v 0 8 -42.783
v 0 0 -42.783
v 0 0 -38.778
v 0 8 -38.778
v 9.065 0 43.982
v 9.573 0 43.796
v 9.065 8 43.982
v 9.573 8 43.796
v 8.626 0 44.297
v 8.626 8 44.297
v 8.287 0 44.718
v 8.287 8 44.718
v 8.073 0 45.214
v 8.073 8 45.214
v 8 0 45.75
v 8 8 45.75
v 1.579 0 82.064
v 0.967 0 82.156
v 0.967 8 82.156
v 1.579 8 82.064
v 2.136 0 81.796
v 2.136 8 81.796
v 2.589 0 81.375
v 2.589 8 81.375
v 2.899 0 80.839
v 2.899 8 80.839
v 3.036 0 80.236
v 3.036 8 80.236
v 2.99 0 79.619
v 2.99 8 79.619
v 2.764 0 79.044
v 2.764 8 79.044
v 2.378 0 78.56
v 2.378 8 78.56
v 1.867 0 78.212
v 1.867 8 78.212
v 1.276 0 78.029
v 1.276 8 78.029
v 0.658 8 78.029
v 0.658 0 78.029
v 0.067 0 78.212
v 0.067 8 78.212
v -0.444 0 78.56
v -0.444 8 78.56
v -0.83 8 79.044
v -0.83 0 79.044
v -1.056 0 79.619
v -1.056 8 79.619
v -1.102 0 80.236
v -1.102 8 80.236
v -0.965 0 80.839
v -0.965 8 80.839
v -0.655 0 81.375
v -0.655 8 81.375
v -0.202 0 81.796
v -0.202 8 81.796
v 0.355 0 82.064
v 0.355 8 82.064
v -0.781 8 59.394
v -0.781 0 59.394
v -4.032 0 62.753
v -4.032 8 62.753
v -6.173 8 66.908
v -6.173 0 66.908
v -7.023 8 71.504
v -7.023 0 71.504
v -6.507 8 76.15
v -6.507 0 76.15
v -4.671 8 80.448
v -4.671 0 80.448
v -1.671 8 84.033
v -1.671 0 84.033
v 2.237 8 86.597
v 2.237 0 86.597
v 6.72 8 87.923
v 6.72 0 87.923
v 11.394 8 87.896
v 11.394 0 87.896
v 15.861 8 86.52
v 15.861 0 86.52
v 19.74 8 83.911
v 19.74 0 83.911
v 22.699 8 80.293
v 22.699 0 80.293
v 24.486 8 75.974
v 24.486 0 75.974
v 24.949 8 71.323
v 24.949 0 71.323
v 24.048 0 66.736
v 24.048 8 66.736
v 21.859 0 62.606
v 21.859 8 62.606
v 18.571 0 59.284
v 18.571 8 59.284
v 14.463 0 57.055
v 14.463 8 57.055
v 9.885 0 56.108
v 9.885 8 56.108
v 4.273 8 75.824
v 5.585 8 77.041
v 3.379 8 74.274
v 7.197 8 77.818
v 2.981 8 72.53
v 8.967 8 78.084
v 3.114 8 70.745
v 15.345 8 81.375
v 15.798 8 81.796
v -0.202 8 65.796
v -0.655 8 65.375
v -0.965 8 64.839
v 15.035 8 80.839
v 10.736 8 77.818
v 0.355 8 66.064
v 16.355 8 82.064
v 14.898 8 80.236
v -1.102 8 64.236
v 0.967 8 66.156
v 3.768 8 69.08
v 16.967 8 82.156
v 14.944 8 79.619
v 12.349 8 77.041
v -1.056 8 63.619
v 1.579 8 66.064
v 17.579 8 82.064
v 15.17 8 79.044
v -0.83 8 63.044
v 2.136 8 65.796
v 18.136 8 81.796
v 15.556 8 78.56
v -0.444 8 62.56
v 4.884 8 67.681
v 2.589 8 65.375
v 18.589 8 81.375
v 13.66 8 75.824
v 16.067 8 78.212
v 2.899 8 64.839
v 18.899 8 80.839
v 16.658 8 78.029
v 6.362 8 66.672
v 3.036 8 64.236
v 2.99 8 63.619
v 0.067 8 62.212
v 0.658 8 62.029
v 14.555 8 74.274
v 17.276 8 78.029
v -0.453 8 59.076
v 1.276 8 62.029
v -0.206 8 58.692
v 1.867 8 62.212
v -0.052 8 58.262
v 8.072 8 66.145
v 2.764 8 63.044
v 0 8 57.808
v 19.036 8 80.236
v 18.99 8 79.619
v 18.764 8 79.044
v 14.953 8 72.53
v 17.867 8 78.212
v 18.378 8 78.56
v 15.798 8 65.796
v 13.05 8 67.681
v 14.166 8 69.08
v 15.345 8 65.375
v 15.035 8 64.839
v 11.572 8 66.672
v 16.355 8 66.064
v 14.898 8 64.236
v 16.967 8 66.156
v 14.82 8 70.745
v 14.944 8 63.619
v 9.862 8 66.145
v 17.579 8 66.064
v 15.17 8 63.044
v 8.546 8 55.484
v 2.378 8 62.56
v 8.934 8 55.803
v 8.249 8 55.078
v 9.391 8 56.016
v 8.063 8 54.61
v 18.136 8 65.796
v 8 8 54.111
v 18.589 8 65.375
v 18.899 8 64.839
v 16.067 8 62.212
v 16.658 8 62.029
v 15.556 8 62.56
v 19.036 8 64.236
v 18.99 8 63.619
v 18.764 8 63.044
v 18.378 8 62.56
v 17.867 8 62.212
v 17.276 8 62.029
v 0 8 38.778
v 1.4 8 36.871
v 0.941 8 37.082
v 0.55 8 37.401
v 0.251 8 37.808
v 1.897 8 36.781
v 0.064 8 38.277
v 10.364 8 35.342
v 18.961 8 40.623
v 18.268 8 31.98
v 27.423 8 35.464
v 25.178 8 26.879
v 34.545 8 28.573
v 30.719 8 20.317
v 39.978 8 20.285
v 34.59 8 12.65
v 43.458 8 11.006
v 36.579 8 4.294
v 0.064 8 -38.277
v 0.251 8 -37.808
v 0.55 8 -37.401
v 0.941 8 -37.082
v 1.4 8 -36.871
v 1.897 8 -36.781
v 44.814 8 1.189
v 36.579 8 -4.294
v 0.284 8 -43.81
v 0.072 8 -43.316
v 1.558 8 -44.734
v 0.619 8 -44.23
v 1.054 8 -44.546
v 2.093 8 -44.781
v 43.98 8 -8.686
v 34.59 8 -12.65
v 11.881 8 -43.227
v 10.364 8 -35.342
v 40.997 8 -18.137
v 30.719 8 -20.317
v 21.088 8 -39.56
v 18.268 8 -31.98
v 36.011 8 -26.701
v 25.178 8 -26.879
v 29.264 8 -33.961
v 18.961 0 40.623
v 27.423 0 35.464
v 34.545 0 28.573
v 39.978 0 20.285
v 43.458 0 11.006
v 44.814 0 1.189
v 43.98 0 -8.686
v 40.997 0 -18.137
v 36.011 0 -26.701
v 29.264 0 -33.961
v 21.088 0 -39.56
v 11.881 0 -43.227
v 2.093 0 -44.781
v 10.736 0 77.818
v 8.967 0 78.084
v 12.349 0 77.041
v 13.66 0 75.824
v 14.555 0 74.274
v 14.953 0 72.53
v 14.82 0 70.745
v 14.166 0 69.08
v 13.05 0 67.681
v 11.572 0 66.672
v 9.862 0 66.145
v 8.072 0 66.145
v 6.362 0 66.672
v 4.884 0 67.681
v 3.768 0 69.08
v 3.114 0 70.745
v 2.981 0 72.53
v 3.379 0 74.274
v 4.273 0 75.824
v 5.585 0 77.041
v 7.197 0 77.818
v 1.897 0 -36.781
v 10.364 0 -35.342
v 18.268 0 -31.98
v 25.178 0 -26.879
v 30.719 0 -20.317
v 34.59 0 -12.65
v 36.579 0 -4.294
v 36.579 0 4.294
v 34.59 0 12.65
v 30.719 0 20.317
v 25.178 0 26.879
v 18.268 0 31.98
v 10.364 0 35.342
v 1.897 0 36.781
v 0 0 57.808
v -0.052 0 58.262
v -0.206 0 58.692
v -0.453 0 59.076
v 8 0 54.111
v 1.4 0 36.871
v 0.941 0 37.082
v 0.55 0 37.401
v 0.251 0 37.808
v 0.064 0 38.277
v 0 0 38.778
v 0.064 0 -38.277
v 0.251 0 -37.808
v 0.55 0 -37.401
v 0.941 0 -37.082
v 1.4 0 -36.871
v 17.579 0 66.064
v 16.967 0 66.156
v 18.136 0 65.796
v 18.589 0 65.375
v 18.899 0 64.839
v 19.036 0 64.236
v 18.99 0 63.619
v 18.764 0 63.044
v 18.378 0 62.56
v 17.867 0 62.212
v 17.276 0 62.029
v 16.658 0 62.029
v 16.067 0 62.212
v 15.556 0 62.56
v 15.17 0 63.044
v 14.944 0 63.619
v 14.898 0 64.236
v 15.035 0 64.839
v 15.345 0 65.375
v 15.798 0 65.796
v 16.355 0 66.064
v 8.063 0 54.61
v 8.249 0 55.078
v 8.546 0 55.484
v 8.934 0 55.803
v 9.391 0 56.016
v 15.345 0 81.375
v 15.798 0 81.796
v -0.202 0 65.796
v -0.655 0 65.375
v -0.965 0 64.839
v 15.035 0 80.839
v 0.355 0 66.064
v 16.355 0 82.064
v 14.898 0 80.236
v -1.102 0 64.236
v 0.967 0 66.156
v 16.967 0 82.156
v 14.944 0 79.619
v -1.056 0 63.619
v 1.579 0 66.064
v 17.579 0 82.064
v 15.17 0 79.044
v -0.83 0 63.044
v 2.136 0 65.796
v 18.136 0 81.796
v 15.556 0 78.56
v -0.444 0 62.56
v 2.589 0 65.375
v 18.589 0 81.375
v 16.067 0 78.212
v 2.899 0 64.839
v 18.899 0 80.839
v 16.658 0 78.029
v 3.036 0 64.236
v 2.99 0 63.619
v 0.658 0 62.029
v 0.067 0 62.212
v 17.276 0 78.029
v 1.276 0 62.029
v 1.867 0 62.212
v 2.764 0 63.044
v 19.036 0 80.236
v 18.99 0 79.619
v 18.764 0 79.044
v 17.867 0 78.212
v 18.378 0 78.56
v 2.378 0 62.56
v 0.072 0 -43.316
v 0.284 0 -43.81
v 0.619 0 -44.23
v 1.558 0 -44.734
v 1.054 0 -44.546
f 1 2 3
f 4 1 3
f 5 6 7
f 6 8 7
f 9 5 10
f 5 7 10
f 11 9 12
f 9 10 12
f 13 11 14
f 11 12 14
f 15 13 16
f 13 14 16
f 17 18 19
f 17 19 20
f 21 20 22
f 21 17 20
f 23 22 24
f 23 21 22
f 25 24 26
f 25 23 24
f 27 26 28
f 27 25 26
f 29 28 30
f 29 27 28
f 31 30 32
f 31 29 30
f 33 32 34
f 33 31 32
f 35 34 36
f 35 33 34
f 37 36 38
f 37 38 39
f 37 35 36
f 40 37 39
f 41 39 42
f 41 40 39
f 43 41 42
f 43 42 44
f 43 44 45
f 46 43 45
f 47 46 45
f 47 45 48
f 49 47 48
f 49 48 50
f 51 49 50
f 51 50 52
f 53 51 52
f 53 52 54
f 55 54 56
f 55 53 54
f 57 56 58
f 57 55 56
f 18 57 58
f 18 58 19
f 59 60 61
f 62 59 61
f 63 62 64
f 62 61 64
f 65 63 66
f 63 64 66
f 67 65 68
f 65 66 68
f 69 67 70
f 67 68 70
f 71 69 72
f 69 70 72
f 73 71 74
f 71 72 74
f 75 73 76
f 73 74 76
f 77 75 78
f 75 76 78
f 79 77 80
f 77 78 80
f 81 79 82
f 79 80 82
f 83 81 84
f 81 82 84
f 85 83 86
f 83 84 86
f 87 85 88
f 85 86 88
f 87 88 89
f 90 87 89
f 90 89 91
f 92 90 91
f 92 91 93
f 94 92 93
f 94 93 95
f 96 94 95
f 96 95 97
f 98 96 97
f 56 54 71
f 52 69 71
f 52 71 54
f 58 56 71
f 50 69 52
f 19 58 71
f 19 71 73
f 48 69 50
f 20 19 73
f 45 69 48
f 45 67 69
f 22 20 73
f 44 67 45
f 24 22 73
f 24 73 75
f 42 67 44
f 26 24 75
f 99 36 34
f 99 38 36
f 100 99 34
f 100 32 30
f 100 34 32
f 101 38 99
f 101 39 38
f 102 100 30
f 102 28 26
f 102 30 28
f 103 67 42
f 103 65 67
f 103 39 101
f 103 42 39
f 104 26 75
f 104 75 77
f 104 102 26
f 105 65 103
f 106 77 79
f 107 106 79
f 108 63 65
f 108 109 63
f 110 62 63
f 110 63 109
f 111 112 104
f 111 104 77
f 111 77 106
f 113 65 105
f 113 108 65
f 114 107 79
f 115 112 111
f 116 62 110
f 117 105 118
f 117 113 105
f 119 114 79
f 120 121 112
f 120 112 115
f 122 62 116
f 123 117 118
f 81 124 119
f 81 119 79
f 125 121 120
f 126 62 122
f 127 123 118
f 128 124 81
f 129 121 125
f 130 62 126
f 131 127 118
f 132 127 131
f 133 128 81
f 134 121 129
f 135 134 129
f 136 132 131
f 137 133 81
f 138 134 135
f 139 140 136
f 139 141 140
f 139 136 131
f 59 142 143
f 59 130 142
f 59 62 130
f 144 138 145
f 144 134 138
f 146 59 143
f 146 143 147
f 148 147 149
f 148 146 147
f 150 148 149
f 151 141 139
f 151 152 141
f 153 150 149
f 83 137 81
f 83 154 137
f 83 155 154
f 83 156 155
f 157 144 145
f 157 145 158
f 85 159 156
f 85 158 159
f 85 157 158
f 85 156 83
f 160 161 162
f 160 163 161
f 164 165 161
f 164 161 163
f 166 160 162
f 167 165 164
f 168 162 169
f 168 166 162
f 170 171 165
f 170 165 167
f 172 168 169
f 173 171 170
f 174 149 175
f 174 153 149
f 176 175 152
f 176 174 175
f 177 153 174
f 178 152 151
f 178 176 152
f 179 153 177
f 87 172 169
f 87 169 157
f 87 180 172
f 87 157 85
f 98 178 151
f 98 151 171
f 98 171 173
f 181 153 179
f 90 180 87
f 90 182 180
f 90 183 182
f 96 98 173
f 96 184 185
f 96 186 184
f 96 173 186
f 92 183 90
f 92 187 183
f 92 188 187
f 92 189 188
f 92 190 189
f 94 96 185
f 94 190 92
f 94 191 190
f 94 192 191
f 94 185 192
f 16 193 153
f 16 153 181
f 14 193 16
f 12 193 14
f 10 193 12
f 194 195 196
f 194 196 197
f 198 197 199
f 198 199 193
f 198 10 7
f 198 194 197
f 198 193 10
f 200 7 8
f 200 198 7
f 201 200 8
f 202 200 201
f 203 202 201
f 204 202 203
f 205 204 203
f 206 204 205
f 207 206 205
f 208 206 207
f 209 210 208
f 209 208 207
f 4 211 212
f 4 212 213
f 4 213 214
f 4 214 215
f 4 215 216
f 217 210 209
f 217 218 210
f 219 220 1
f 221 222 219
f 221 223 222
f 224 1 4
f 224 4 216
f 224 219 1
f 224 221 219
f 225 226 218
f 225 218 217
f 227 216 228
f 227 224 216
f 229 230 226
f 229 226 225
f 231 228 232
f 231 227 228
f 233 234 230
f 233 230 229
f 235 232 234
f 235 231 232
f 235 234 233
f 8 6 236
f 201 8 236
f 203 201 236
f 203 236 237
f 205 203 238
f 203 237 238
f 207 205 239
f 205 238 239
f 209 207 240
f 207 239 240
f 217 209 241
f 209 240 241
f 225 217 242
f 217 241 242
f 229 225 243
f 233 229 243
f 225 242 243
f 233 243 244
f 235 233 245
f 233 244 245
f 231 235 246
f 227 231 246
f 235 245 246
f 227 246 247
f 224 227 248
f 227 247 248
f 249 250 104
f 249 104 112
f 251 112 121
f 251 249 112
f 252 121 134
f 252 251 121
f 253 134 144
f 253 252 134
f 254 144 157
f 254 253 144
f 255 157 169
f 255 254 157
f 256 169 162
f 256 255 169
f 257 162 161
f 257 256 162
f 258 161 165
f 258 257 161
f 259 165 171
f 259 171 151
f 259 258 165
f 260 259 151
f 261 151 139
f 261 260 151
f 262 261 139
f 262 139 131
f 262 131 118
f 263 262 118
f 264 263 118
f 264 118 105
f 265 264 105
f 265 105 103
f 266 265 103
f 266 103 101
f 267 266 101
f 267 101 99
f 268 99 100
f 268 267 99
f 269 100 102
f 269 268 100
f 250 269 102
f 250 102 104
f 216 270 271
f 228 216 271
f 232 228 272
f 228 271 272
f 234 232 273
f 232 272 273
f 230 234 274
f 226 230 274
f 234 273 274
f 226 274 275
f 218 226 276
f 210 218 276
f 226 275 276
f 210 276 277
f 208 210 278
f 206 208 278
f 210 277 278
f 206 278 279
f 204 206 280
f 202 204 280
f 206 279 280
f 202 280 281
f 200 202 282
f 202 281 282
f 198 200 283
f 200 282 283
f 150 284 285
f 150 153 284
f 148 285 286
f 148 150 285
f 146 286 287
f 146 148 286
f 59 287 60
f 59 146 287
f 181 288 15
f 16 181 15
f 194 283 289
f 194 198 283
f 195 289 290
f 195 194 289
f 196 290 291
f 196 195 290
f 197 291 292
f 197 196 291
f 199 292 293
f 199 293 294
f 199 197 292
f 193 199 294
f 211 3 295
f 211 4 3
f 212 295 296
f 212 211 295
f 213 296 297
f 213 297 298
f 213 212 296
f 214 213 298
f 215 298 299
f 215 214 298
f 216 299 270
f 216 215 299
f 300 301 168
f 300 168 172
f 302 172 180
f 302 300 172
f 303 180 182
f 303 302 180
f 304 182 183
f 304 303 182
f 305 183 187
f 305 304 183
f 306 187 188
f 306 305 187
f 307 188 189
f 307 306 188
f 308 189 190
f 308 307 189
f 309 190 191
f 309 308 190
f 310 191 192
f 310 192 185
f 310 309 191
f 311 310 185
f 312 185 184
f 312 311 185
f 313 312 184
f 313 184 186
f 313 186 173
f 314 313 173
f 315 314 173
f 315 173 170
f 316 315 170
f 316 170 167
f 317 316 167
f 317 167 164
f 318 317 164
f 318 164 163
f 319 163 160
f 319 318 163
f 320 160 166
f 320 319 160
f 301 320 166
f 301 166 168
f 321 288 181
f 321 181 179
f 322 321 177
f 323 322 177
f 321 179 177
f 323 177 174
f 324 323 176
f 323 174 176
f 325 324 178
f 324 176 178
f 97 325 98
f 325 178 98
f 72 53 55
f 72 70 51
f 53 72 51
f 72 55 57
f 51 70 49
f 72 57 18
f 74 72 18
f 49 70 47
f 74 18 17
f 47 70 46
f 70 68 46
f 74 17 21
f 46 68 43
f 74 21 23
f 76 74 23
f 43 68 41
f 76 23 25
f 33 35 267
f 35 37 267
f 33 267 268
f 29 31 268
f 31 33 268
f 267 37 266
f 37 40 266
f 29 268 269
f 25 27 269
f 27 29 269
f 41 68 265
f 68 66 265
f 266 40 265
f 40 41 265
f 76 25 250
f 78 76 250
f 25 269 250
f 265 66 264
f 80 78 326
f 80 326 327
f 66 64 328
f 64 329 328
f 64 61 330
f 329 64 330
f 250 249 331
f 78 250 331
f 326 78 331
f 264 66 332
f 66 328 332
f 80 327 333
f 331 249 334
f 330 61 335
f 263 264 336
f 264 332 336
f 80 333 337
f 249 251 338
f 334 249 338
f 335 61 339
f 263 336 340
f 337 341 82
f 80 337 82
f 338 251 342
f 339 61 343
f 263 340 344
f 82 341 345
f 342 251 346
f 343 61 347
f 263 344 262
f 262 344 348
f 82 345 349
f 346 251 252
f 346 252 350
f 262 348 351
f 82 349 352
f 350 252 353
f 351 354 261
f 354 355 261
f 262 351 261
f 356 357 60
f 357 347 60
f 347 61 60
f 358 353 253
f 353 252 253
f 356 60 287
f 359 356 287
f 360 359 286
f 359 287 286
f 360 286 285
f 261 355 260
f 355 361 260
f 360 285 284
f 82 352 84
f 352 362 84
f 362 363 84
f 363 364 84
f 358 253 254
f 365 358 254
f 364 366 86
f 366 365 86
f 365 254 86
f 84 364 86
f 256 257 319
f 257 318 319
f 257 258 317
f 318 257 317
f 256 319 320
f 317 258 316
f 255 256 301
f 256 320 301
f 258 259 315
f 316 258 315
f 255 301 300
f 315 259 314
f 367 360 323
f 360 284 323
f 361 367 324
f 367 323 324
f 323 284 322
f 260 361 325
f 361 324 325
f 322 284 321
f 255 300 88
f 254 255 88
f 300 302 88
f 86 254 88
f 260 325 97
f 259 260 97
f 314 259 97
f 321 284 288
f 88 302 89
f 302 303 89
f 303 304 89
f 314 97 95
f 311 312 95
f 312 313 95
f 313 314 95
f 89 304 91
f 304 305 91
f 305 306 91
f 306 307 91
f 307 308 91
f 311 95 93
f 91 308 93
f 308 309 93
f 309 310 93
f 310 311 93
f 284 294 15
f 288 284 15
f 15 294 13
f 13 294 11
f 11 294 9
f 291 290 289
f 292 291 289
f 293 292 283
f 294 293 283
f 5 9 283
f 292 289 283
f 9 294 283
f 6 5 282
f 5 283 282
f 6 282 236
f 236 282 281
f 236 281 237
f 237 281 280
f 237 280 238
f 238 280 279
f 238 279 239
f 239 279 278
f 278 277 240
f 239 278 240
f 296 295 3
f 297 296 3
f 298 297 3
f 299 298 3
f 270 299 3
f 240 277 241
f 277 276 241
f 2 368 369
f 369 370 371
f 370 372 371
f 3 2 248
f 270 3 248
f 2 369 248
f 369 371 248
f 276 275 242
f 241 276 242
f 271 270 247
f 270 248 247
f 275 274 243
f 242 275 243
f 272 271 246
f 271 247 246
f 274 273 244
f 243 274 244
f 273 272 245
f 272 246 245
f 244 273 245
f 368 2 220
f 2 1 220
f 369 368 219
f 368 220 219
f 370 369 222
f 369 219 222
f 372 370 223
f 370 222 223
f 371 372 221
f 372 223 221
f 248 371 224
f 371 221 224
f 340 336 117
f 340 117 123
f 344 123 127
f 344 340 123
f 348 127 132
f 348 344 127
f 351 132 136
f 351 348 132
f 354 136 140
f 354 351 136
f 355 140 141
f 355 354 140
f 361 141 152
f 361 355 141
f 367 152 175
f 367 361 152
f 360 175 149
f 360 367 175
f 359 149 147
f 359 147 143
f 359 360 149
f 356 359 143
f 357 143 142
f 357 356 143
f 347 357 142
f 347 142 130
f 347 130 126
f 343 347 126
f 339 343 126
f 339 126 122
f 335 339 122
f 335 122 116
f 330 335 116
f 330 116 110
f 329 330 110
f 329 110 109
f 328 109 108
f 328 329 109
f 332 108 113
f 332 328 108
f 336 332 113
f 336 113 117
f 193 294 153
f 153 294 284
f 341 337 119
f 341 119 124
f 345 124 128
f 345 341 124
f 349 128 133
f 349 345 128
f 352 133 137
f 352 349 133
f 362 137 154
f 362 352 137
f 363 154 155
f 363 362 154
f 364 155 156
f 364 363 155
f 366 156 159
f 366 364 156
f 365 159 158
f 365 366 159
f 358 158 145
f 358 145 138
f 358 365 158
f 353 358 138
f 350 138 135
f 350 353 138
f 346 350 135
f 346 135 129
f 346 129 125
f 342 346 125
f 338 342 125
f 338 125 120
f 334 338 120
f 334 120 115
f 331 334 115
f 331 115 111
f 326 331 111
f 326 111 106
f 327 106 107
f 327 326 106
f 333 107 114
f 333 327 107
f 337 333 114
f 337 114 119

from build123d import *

# Parameters (mm, degrees)
SKETCH1_R           = 2.075
SKETCH1_R_2         = 6.003208263
BOSS_EXTRUDE2_DEPTH = 8
FILLET1_R           = 2


with BuildPart() as part:
    # Sketch1 → Boss-Extrude2 (new body)
    with BuildSketch(Plane(origin=(0, 0, 0), x_dir=(1, 0, 0), z_dir=(0, 1, 0))):
        with BuildLine():
            Line((0, 44.83), (0, 36.83))
            ThreePointArc((0, 36.83), (36.83, 0), (0, -36.83))
            Line((0, -36.83), (0, -46.83))
            Line((0, -46.83), (0, -58.83))
            ThreePointArc((0, -58.83), (14.116701064, -87.229775601), (8, -56.110417137))
            Line((8, -56.110417137), (8, -44.110417137))
            ThreePointArc((8, -44.110417137), (44.649741882, 4.016148637), (0, 44.83))
        make_face()
        with Locations(Location((0.96696537, -64.081170969, 0), (0, 0, 270))):
            Circle(SKETCH1_R, mode=Mode.SUBTRACT)
        with Locations(Location((16.96696537, -64.081170969, 0), (0, 0, 270))):
            Circle(SKETCH1_R, mode=Mode.SUBTRACT)
        with Locations(Location((16.96696537, -80.081170969, 0), (0, 0, 270))):
            Circle(SKETCH1_R, mode=Mode.SUBTRACT)
        with Locations(Location((0.96696537, -80.081170969, 0), (0, 0, 270))):
            Circle(SKETCH1_R, mode=Mode.SUBTRACT)
        with Locations(Location((8.96696537, -72.081170969, 0), (0, 0, 270))):
            Circle(SKETCH1_R_2, mode=Mode.SUBTRACT)
    extrude(amount=BOSS_EXTRUDE2_DEPTH)

    # Fillet1
    fillet1_edges = [part.edges().sort_by_distance(p)[0] for p in [
        (0, 4, 58.83),
        (0, 4, 36.83),
        (0, 4, -36.83),
        (0, 4, -44.83),
        (8, 4, 44.110417137),
        (8, 4, 56.110417137),
    ]]
    fillet(fillet1_edges, radius=FILLET1_R)


solid = part.part
